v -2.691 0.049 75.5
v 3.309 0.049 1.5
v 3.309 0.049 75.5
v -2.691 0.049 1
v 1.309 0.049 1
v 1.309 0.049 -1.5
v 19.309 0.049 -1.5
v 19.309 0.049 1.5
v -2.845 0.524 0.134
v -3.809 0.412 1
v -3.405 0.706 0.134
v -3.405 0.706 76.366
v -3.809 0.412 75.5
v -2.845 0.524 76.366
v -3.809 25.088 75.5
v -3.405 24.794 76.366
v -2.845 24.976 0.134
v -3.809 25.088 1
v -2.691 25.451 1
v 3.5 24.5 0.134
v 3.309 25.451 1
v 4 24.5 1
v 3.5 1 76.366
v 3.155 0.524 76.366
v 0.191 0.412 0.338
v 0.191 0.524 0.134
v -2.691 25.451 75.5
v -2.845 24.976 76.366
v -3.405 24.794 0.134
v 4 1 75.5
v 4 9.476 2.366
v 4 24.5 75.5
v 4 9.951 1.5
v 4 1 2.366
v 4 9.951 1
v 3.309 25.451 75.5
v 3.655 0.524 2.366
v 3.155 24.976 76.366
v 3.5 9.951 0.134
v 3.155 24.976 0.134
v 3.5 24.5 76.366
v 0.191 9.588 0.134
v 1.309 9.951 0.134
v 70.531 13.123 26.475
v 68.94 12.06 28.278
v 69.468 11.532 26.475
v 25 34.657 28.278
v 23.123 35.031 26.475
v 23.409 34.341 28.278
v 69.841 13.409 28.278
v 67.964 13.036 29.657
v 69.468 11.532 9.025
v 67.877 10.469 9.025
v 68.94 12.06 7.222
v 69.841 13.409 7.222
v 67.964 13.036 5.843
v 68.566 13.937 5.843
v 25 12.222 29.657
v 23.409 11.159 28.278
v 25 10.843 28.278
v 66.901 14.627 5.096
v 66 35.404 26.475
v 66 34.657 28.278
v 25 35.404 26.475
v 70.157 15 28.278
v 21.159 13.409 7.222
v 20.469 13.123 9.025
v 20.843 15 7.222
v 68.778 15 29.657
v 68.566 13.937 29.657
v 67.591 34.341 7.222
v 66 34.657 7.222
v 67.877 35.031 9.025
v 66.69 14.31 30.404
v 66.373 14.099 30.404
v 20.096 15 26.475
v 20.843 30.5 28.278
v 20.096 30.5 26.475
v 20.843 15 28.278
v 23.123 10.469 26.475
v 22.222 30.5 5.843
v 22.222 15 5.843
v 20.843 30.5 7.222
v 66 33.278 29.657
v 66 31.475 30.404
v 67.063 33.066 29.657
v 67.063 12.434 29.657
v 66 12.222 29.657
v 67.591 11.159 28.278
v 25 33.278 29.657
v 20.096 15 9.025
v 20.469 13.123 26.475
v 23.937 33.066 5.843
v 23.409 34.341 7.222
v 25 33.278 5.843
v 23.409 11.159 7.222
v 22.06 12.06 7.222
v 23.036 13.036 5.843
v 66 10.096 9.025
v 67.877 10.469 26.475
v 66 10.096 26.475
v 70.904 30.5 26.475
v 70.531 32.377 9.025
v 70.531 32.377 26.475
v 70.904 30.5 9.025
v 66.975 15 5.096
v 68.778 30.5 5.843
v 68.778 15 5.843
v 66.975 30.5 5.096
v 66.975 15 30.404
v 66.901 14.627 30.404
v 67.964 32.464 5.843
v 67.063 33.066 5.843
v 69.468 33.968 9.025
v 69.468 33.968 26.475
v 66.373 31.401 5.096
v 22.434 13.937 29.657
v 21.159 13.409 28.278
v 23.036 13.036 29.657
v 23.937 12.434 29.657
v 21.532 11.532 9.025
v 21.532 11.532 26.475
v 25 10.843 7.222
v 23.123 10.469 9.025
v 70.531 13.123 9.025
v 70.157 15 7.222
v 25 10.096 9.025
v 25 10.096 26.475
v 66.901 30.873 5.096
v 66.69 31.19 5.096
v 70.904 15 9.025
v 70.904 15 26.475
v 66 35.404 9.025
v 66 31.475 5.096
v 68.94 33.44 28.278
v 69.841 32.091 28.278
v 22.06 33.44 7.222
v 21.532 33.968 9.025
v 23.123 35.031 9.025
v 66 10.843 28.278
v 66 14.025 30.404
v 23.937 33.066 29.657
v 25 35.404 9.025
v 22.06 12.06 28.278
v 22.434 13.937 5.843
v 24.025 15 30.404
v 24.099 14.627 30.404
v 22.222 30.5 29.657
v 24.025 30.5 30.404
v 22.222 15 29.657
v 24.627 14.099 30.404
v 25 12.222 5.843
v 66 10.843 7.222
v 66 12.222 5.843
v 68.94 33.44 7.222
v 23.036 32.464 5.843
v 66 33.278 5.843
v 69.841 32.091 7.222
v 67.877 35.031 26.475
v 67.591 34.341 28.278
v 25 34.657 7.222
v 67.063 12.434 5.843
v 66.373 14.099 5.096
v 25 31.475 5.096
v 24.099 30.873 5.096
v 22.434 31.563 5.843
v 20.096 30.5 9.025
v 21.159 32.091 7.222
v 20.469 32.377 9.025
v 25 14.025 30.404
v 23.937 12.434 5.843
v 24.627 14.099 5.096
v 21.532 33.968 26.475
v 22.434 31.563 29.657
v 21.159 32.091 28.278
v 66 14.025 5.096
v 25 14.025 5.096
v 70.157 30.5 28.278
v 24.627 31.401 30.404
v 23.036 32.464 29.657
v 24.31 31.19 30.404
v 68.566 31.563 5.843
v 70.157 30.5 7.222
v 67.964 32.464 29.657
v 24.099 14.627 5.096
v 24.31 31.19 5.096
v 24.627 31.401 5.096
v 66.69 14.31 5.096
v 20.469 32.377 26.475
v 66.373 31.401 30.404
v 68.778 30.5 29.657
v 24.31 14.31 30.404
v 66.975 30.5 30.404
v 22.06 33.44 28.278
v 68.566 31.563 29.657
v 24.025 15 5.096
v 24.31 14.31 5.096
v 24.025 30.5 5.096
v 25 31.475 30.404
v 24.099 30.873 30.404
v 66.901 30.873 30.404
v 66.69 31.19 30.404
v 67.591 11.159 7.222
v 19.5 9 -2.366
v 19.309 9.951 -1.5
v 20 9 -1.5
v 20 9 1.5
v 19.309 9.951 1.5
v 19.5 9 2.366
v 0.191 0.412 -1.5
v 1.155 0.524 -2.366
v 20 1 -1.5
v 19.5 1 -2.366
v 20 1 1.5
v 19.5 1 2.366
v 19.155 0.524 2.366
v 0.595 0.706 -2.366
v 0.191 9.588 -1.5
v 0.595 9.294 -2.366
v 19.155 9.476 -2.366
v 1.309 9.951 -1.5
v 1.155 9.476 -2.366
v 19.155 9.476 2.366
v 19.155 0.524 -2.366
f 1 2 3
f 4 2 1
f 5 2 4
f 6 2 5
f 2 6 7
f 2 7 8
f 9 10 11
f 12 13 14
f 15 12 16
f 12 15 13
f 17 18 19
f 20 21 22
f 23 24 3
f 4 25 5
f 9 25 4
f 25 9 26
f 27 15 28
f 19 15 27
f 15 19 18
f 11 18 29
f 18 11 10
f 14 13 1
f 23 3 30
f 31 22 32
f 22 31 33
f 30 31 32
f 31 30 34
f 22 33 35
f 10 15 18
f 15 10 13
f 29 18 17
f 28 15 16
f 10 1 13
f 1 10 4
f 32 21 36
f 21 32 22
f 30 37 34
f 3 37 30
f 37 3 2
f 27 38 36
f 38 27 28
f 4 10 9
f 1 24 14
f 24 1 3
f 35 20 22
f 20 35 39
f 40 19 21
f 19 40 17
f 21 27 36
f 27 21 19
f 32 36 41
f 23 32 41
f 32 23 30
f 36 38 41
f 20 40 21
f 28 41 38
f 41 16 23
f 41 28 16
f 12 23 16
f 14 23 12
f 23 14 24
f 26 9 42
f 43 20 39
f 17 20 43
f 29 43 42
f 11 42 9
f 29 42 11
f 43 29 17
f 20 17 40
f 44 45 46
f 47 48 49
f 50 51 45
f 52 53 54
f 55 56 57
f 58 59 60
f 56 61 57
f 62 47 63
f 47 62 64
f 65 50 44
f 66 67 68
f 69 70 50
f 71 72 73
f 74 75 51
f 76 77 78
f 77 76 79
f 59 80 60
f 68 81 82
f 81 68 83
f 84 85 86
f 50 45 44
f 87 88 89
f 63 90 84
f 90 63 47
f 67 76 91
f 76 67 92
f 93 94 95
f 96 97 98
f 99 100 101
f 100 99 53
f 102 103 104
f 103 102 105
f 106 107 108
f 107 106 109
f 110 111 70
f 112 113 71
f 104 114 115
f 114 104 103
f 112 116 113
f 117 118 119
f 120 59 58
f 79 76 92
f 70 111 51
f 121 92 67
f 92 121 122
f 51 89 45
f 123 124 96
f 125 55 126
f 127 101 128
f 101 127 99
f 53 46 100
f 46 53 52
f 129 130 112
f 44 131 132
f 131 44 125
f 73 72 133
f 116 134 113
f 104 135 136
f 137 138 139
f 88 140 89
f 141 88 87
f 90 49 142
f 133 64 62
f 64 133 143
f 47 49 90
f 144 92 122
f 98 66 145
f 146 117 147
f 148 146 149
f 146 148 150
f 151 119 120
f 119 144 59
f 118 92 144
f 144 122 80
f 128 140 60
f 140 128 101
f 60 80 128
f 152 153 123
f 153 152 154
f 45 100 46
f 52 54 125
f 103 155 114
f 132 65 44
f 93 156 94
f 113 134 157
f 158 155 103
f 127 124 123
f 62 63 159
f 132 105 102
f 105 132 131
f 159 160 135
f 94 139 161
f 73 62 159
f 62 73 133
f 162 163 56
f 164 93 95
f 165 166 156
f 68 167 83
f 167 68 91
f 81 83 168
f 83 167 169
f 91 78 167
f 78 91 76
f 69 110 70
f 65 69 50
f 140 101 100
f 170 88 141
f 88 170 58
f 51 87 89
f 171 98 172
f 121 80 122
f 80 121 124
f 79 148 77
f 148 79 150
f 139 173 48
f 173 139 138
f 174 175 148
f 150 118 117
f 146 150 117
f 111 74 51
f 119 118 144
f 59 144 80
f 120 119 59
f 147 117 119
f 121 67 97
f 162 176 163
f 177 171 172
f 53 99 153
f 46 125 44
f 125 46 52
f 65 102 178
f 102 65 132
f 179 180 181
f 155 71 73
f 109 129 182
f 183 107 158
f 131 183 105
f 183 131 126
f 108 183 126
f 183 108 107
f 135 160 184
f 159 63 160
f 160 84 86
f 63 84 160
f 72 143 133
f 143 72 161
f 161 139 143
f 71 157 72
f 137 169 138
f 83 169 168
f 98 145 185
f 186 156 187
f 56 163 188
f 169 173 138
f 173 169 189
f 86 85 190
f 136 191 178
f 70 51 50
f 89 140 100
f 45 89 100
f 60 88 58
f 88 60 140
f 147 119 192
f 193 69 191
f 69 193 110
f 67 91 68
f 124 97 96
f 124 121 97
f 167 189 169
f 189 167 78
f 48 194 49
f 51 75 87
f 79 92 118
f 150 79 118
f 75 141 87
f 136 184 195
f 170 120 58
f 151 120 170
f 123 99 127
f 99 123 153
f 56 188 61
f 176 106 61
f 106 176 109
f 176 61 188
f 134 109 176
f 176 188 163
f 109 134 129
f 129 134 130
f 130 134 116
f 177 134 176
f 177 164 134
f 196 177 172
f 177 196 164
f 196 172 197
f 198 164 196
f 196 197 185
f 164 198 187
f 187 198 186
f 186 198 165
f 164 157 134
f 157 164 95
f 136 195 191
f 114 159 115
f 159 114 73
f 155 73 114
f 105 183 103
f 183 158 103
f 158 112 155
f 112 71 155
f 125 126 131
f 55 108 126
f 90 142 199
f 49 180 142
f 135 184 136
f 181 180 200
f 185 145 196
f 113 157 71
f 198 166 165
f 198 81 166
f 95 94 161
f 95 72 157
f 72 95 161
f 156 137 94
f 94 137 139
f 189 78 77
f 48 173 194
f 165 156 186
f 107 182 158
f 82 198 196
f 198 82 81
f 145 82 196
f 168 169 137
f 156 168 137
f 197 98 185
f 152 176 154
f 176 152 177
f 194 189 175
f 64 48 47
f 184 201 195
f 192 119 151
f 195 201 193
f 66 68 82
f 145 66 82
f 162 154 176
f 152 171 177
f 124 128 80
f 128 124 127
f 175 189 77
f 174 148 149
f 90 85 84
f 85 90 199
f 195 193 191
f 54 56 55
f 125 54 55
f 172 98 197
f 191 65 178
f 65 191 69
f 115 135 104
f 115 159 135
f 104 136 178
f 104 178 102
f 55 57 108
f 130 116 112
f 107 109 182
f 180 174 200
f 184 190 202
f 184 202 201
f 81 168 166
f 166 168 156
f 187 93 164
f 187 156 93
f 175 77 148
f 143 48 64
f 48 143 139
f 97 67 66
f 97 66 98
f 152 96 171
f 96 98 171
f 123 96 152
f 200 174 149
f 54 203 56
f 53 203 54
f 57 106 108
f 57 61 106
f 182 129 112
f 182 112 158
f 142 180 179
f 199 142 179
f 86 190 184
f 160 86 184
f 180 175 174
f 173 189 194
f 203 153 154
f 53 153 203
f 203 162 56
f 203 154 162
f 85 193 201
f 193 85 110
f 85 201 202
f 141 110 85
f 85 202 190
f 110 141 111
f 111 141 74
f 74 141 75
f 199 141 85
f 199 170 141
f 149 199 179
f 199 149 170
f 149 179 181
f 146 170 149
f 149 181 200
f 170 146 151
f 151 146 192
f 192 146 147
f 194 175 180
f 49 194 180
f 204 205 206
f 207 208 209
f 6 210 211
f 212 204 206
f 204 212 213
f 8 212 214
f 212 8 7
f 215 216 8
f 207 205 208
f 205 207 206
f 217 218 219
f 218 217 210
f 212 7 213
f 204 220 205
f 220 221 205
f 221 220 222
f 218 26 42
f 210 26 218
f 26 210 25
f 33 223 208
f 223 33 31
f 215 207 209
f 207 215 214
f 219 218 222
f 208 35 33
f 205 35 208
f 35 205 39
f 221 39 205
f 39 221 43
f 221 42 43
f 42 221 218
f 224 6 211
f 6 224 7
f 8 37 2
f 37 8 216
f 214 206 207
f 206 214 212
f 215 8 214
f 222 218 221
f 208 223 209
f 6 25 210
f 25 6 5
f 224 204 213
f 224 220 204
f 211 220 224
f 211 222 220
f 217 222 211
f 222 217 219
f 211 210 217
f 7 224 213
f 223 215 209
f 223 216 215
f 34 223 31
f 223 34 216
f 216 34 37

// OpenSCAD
// file: defaults.scad
base_size = 25.5;
plate_thickness = base_size / 8;
roundcorner_radius = 1;
// main file
include <defaults.scad>



module bar(x = base_size, y = base_size, z = plate_thickness, roundcorner_radius = 1, color = "purple", center_x = false, center_y = false, center_z = false) {
    
    x_offset = center_x ? -1 * (x / 2) : 0;
    y_offset = center_y ? -1 * (y / 2) : 0;
    z_offset = center_z ? -1 * (z / 2) : 0;


    translate([roundcorner_radius + x_offset, roundcorner_radius + y_offset, roundcorner_radius + z_offset]) {
        color(color) {
            minkowski() {
                cube([x - (roundcorner_radius * 2), y - (roundcorner_radius * 2), z - (roundcorner_radius * 2)]);
                sphere(r = roundcorner_radius);
            }
        }
    }
}




bar(x = 8, y = base_size, z = base_size * 3, roundcorner_radius = 1, center_x = true);

translate([20, 10, 5])
    bar(x = base_size * 2, y = base_size, z = base_size, roundcorner_radius = 5, color = "cyan");


bar(20, 10, 5, color = "red", center_z = true);
